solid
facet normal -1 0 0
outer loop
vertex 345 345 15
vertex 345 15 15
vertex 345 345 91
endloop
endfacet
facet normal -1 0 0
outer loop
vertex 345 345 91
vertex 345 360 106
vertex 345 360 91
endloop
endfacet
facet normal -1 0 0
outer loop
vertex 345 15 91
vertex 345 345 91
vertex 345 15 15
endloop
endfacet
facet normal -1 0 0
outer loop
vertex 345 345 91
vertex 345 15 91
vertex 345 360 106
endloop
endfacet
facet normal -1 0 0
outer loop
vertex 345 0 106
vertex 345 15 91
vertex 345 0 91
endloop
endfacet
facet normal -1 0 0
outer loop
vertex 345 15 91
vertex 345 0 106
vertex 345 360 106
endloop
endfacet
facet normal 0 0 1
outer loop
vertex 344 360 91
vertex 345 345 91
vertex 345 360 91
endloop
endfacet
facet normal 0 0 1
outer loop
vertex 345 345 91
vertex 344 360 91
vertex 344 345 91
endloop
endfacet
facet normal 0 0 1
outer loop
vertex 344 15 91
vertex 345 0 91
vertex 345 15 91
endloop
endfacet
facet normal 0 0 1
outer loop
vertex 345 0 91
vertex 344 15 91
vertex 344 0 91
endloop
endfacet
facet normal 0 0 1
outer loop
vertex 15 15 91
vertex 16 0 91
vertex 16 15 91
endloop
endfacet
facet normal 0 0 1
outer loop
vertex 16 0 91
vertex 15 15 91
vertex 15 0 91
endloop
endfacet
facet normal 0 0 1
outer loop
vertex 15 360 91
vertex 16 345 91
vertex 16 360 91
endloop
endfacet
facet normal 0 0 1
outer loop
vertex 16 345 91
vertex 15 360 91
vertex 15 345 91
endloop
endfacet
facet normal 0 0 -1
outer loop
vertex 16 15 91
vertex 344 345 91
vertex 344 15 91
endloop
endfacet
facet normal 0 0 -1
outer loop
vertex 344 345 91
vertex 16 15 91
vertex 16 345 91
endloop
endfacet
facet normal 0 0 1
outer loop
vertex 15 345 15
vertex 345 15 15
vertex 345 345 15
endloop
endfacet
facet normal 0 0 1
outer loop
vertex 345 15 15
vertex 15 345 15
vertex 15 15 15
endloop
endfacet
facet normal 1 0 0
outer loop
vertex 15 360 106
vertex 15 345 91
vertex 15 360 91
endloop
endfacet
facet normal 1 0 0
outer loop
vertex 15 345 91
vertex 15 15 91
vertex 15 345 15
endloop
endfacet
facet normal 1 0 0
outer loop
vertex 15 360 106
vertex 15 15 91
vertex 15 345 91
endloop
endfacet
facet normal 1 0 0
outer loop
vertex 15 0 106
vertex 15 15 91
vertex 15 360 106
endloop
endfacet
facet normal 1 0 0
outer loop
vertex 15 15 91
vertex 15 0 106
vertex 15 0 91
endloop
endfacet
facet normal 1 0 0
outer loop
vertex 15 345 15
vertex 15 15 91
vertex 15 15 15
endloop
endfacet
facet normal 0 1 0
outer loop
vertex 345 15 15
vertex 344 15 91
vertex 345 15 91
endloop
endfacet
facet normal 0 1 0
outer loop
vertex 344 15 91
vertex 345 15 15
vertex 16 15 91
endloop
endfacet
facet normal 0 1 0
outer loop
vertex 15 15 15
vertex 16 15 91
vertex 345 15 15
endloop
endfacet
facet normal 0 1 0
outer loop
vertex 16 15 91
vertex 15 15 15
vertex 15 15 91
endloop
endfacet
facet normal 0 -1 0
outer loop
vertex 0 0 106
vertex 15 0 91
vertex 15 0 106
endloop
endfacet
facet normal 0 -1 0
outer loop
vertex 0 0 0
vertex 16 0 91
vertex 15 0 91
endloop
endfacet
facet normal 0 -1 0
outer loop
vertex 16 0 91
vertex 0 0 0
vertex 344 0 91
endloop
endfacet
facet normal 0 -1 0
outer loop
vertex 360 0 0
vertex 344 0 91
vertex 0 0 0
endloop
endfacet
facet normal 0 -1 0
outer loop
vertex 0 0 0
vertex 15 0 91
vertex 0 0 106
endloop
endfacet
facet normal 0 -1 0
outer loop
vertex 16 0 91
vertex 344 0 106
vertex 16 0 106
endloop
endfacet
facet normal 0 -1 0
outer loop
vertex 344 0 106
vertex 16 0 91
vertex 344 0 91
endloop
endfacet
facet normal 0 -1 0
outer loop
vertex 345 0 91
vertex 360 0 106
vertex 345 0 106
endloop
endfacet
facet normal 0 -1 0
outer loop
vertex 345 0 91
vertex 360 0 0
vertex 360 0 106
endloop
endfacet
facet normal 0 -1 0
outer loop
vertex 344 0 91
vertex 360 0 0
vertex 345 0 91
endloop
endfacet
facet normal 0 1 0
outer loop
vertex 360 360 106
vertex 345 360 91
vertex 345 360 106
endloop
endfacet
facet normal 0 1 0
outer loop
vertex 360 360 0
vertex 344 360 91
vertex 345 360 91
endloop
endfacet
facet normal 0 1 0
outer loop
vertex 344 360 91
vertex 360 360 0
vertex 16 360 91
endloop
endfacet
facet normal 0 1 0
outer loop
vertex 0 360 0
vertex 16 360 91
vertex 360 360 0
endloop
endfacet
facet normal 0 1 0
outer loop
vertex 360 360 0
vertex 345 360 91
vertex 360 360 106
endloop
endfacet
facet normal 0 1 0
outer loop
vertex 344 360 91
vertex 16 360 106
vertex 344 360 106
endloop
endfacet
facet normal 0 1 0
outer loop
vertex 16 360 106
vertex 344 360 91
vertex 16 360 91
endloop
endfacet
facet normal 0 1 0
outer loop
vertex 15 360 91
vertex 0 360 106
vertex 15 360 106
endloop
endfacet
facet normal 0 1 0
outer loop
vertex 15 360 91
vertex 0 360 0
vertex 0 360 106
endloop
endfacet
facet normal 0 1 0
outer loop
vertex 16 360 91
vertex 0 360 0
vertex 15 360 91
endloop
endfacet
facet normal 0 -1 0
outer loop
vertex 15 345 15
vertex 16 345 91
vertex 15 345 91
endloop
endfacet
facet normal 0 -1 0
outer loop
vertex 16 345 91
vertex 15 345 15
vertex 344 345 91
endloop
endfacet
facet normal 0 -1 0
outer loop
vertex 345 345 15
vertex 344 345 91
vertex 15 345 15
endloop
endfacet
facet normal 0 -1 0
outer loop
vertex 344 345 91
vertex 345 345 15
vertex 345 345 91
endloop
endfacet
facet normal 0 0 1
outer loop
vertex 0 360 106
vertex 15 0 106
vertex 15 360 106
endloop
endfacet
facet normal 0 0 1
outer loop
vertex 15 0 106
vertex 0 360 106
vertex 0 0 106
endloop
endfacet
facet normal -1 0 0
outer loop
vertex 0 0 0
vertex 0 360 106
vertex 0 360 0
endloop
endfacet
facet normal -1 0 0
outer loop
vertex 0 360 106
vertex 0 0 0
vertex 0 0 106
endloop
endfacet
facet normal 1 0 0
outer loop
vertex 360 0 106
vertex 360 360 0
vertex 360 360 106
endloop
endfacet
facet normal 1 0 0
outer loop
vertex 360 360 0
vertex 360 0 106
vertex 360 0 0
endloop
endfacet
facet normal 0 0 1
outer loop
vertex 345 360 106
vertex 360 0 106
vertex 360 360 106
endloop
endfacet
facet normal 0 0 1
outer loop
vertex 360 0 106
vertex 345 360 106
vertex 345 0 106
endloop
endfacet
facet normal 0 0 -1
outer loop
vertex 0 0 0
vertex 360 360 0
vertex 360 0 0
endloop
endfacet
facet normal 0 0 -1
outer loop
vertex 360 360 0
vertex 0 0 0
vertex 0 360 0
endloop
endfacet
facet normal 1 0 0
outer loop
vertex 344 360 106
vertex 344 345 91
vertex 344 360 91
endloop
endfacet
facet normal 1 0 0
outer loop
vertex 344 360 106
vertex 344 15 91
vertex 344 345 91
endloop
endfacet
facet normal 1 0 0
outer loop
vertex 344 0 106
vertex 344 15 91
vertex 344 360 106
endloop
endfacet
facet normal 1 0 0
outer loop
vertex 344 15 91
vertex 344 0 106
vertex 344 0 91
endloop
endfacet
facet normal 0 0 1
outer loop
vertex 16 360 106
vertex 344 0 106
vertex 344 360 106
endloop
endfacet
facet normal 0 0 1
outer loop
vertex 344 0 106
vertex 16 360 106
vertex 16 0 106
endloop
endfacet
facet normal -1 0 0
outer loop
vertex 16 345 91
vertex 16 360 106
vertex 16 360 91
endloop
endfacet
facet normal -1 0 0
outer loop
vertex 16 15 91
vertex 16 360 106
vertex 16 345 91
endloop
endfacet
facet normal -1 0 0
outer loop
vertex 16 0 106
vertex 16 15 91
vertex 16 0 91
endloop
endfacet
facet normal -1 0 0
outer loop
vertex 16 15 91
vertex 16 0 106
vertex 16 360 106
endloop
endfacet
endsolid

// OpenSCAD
sheet_width = 15;
inner_height = 76;

module a() {
    color("NavajoWhite")
        cube([330, sheet_width, inner_height]);
}

module b() {
    color("BurlyWood")
        cube([sheet_width, 360, inner_height + sheet_width]);
}
module c() {
    color("BlanchedAlmond")
        cube([360, 360, sheet_width]);
}

module d() {
    color("Wheat")
        cube([328, 360, sheet_width]);
}

c();
translate([0, 0, sheet_width]) {
    translate([sheet_width, 0, 0]) {
        a();
        translate([0, 360 - sheet_width, 0])
            a();
    }
    b();
    translate([360-sheet_width, 0, 0])
        b();
}
translate([sheet_width + 1, 0, inner_height + sheet_width])
    #d();
